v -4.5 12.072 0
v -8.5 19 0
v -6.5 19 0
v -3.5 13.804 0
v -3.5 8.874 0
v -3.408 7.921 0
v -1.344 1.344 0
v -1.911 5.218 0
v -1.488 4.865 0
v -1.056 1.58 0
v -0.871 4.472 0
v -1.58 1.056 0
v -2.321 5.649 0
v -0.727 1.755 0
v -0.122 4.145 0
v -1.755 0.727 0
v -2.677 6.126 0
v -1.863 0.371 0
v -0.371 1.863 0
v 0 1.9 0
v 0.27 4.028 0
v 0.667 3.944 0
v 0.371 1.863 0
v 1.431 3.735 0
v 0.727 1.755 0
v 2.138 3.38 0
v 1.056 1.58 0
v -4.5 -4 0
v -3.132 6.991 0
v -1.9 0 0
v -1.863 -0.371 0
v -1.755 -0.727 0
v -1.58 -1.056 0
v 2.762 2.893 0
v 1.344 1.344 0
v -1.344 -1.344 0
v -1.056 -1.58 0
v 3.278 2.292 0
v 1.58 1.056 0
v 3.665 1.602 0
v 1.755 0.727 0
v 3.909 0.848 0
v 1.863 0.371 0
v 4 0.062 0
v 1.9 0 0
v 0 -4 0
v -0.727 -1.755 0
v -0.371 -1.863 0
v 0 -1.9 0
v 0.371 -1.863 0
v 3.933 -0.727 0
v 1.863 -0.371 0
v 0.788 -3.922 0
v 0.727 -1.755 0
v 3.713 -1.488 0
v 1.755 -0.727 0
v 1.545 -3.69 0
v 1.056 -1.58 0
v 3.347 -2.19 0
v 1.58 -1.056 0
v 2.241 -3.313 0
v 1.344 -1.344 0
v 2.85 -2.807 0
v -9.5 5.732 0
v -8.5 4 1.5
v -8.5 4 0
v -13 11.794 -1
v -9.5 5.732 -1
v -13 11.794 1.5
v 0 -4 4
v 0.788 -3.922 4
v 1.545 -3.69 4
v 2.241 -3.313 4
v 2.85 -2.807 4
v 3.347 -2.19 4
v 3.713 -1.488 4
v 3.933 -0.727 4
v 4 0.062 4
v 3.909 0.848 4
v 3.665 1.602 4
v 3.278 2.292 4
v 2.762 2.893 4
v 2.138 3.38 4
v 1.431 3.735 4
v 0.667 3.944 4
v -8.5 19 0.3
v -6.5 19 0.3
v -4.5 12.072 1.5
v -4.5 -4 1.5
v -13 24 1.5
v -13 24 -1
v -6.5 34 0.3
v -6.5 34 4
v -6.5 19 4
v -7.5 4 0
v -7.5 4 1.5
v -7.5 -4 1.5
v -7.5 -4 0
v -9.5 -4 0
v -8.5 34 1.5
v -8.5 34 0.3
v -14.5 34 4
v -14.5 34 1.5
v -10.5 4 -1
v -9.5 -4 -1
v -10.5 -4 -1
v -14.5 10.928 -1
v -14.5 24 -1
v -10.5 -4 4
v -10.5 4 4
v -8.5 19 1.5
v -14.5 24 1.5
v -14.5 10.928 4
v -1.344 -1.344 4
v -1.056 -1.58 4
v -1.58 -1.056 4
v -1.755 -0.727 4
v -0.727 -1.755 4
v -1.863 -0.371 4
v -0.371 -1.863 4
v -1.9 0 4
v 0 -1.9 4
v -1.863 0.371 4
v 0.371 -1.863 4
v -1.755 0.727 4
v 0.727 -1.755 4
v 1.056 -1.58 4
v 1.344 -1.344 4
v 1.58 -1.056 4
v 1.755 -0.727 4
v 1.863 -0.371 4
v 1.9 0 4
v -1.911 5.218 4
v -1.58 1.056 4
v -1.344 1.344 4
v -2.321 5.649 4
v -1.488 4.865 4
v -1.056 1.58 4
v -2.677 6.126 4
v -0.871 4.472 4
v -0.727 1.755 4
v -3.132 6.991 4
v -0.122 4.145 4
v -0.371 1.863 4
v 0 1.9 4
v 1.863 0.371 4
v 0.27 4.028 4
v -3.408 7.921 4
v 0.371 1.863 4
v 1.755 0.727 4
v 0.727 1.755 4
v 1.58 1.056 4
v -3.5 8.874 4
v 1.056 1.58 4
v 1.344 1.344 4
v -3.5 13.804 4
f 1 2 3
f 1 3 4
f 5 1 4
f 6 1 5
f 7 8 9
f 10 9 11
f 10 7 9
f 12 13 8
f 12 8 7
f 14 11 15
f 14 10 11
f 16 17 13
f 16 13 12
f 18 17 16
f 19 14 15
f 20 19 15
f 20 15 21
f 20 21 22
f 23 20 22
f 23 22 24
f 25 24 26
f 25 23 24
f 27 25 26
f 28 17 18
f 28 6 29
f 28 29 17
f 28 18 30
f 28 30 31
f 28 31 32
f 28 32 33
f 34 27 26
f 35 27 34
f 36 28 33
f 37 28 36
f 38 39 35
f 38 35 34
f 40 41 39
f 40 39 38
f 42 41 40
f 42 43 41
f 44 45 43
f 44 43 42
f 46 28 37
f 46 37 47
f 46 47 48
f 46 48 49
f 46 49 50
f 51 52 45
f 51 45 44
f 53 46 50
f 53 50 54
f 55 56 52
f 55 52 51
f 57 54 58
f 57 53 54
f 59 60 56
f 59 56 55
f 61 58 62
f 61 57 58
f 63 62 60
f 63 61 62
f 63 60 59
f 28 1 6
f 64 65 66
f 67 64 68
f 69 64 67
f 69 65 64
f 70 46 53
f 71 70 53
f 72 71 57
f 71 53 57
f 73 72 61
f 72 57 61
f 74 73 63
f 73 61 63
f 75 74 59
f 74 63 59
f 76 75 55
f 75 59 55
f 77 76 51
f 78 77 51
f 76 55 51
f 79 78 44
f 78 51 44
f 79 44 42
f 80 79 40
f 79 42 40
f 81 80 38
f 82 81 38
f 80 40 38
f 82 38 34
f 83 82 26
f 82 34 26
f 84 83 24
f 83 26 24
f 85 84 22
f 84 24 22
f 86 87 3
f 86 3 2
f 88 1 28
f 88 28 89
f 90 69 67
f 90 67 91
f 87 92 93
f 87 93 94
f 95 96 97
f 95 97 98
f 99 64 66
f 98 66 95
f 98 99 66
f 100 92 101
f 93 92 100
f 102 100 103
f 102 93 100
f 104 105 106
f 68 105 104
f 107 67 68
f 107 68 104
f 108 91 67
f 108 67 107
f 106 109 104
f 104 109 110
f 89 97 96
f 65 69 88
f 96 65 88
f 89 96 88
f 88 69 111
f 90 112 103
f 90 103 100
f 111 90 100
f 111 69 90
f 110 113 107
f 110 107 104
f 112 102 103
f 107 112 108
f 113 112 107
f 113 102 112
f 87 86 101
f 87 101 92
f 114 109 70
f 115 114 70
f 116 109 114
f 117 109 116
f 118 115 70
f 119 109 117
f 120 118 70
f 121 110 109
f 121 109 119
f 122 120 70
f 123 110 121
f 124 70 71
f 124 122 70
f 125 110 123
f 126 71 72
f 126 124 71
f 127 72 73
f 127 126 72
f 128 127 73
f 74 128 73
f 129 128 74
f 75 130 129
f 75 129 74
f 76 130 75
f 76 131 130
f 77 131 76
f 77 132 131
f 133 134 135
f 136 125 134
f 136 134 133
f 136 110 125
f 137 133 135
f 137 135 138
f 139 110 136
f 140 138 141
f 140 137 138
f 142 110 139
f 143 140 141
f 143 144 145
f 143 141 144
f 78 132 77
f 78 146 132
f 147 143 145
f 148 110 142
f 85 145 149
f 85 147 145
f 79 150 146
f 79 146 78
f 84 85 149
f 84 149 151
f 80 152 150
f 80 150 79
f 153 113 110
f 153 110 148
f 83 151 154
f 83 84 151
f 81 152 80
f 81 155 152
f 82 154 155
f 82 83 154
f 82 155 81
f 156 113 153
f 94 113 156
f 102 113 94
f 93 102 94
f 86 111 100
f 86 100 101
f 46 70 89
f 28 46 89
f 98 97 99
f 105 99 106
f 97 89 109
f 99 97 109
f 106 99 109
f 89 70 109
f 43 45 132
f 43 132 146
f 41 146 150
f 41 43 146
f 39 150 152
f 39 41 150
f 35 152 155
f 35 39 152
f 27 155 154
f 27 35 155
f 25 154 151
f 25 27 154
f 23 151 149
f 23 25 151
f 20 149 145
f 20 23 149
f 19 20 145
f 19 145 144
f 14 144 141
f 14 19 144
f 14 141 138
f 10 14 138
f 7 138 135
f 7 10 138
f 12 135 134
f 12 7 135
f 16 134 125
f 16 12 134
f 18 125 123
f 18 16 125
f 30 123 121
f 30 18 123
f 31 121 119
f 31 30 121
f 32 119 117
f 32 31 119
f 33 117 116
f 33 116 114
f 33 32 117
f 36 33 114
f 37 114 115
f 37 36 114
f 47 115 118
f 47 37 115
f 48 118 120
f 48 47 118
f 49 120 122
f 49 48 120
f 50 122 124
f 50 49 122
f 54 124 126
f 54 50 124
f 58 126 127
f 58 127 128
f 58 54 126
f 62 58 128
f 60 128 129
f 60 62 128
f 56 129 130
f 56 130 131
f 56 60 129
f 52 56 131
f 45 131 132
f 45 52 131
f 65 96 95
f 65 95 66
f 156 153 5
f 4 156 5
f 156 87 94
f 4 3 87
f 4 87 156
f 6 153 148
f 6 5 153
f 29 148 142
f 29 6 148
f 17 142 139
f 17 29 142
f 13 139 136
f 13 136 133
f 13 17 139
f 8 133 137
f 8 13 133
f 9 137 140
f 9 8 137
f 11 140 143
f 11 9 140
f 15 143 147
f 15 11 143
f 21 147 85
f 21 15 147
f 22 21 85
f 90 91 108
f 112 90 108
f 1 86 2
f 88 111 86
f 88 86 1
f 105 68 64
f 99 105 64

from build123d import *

# Parameters (mm, degrees)
SKETCH_1_R          = 1.9
EXTRUDE_1_DEPTH     = 4
SKETCH_2_W          = 3
SKETCH_2_H          = 1.5
CUT_EXTRUDE_1_DEPTH = 14.793114224
SKETCH_3_W          = 1
SKETCH_3_H          = 8
EXTRUDE_2_DEPTH     = 1
SKETCH_4_W          = 5.5
SKETCH_4_H          = 30
EXTRUDE_3_DEPTH     = 2.5
EXTRUDE_4_DEPTH     = 15
SKETCH_6_W          = 2
SKETCH_6_H          = 1.2
EXTRUDE_5_DEPTH     = 15
EXTRUDE_6_REACH     = 37.672
CUT_EXTRUDE_2_REACH = 37.809
EXTRUDE_7_DEPTH     = 2.5
EXTRUDE_8_REACH     = 39.047
SKETCH_11_W         = 1.5
SKETCH_11_H         = 10
CUT_EXTRUDE_3_DEPTH = 2.5
CUT_EXTRUDE_4_REACH = 35.56
SKETCH_12_W         = 1
SKETCH_12_H         = 1
FILLET_1_R          = 5


with BuildPart() as part:
    # 草图1 → 凸台-拉伸1 (new body)
    with BuildSketch(Plane.XY):
        with BuildLine():
            Line((0, 4), (-10.5, 4))
            Line((-10.5, 4), (-10.5, -4))
            Line((-10.5, -4), (0, -4))
            ThreePointArc((0, -4), (4, 0), (0, 4))
        make_face()
        Circle(SKETCH_1_R, mode=Mode.SUBTRACT)
    extrude(amount=EXTRUDE_1_DEPTH)

    # 草图2 → 切除-拉伸1 (cut, through all)
    with BuildSketch(Plane(origin=(0, 4, 0), x_dir=(1, 0, 0), z_dir=(0, 1, 0))):
        with Locations((-6, -0.75)):
            Rectangle(SKETCH_2_W, SKETCH_2_H)
    extrude(amount=-CUT_EXTRUDE_1_DEPTH, mode=Mode.SUBTRACT)

    # 草图3 → 凸台-拉伸2 (add)
    with BuildSketch(Plane(origin=(0, 0, 0), x_dir=(-1, 0, 0), z_dir=(0, 0, -1))):
        with Locations((10, 0)):
            Rectangle(SKETCH_3_W, SKETCH_3_H)
    extrude(amount=EXTRUDE_2_DEPTH)

    # 草图4 → 凸台-拉伸3 (add)
    with BuildSketch(Plane.XY.offset(4)):
        with Locations((-7.75, 19)):
            Rectangle(SKETCH_4_W, SKETCH_4_H)
    extrude(amount=-EXTRUDE_3_DEPTH)

    # 草图5 → 凸台-拉伸4 (add)
    with BuildSketch(Plane(origin=(0, 4, 0), x_dir=(1, 0, 0), z_dir=(0, 1, 0))):
        Polygon((-5, -4), (-3.5, -4), (-3.5, 0), (-4.5, 0), (-4.5, -1.5), (-5, -1.5), align=None)
    extrude(amount=EXTRUDE_4_DEPTH)

    # 草图6 → 凸台-拉伸5 (add)
    with BuildSketch(Plane(origin=(0, 19, 0), x_dir=(1, 0, 0), z_dir=(0, 1, 0))):
        with Locations((-7.5, -0.9)):
            Rectangle(SKETCH_6_W, SKETCH_6_H)
    extrude(amount=EXTRUDE_5_DEPTH)

    # 凸台-拉伸6: up to this face of the body (flat: up to its plane)
    extrude_6_end = Plane(part.part.faces().sort_by_distance((-8.5, 0, 0))[0])
    # 草图7 → 凸台-拉伸6 (add, up to the picked face)
    with BuildSketch(Plane(origin=(0, 0, 1.5), x_dir=(-1, 0, 0), z_dir=(0, 0, -1)), mode=Mode.PRIVATE) as extrude_6_sk1:
        Polygon((8.5, 19), (4.5, 12.07179677), (4.5, 19), align=None)
    extrude_6_tool1 = split(extrude(extrude_6_sk1.sketch, amount=EXTRUDE_6_REACH, mode=Mode.PRIVATE), bisect_by=extrude_6_end, keep=Keep.BOTH, mode=Mode.PRIVATE)
    add(extrude_6_tool1.solids().sort_by(Axis((-5.833333, 16.690599, 1.5), (0, 0, -1)))[0])

    # 草图8 → 切除-拉伸2 (cut, up to next)
    with BuildSketch(Plane(origin=(0, 0, 0), x_dir=(-1, 0, 0), z_dir=(0, 0, -1)), mode=Mode.PRIVATE) as cut_extrude_2_sk1:
        Polygon((6.5, 34), (6.5, 19), (3.5, 13.803847577), (3.5, 19), (5, 19), (5, 34), align=None)
    cut_extrude_2_tool1 = extrude(cut_extrude_2_sk1.sketch, amount=-CUT_EXTRUDE_2_REACH, mode=Mode.PRIVATE) & part.part
    add(cut_extrude_2_tool1.solids().sort_by_distance((-5.428395, 24.124739, 0))[0], mode=Mode.SUBTRACT)

    # 草图9 → 凸台-拉伸7 (add)
    with BuildSketch(Plane.XY.offset(4)):
        Polygon((-10.5, 34), (-14.5, 34), (-14.5, 10.92820323), (-10.5, 4), align=None)
    extrude(amount=-EXTRUDE_7_DEPTH)

    # 凸台-拉伸8: up to this face of the body (flat: up to its plane)
    extrude_8_end = Plane(part.part.faces().sort_by_distance((-10, 0, -1))[0])
    # 草图10 → 凸台-拉伸8 (add, up to the picked face)
    with BuildSketch(Plane(origin=(0, 0, 1.5), x_dir=(-1, 0, 0), z_dir=(0, 0, -1)), mode=Mode.PRIVATE) as extrude_8_sk1:
        Polygon((8.5, 4), (13, 11.794228634), (13, 34), (14.5, 34), (14.5, 10.92820323), (10.5, 4), align=None)
    extrude_8_tool1 = split(extrude(extrude_8_sk1.sketch, amount=EXTRUDE_8_REACH, mode=Mode.PRIVATE), bisect_by=extrude_8_end, keep=Keep.BOTH, mode=Mode.PRIVATE)
    add(extrude_8_tool1.solids().sort_by(Axis((-13.105485, 18.144493, 1.5), (0, 0, -1)))[0])

    # 草图11 → 切除-拉伸3 (cut)
    with BuildSketch(Plane(origin=(0, 0, -1), x_dir=(-1, 0, 0), z_dir=(0, 0, -1))):
        with Locations((13.75, 29)):
            Rectangle(SKETCH_11_W, SKETCH_11_H)
    extrude(amount=-CUT_EXTRUDE_3_DEPTH, mode=Mode.SUBTRACT)

    # 切除-拉伸4: up to this face of the body (flat: up to its plane)
    cut_extrude_4_end = Plane(part.part.faces().sort_by_distance((-10.75, 7.897114317, 0.25))[0])
    # 草图12 → 切除-拉伸4 (cut, up to the picked face)
    with BuildSketch(Plane.XZ.offset(-4), mode=Mode.PRIVATE) as cut_extrude_4_sk1:
        with Locations((-9, -0.5)):
            Rectangle(SKETCH_12_W, SKETCH_12_H)
    cut_extrude_4_tool1 = split(extrude(cut_extrude_4_sk1.sketch, amount=-CUT_EXTRUDE_4_REACH, mode=Mode.PRIVATE), bisect_by=cut_extrude_4_end, keep=Keep.BOTH, mode=Mode.PRIVATE)
    add(cut_extrude_4_tool1.solids().sort_by(Axis((-9, 4, -0.5), (0, 1, 0)))[0], mode=Mode.SUBTRACT)

    # 圆角1
    fillet_1_edges = [part.edges().sort_by_distance(p)[0] for p in [
        (-3.5, 4, 2),
    ]]
    fillet(fillet_1_edges, radius=FILLET_1_R)


solid = part.part
